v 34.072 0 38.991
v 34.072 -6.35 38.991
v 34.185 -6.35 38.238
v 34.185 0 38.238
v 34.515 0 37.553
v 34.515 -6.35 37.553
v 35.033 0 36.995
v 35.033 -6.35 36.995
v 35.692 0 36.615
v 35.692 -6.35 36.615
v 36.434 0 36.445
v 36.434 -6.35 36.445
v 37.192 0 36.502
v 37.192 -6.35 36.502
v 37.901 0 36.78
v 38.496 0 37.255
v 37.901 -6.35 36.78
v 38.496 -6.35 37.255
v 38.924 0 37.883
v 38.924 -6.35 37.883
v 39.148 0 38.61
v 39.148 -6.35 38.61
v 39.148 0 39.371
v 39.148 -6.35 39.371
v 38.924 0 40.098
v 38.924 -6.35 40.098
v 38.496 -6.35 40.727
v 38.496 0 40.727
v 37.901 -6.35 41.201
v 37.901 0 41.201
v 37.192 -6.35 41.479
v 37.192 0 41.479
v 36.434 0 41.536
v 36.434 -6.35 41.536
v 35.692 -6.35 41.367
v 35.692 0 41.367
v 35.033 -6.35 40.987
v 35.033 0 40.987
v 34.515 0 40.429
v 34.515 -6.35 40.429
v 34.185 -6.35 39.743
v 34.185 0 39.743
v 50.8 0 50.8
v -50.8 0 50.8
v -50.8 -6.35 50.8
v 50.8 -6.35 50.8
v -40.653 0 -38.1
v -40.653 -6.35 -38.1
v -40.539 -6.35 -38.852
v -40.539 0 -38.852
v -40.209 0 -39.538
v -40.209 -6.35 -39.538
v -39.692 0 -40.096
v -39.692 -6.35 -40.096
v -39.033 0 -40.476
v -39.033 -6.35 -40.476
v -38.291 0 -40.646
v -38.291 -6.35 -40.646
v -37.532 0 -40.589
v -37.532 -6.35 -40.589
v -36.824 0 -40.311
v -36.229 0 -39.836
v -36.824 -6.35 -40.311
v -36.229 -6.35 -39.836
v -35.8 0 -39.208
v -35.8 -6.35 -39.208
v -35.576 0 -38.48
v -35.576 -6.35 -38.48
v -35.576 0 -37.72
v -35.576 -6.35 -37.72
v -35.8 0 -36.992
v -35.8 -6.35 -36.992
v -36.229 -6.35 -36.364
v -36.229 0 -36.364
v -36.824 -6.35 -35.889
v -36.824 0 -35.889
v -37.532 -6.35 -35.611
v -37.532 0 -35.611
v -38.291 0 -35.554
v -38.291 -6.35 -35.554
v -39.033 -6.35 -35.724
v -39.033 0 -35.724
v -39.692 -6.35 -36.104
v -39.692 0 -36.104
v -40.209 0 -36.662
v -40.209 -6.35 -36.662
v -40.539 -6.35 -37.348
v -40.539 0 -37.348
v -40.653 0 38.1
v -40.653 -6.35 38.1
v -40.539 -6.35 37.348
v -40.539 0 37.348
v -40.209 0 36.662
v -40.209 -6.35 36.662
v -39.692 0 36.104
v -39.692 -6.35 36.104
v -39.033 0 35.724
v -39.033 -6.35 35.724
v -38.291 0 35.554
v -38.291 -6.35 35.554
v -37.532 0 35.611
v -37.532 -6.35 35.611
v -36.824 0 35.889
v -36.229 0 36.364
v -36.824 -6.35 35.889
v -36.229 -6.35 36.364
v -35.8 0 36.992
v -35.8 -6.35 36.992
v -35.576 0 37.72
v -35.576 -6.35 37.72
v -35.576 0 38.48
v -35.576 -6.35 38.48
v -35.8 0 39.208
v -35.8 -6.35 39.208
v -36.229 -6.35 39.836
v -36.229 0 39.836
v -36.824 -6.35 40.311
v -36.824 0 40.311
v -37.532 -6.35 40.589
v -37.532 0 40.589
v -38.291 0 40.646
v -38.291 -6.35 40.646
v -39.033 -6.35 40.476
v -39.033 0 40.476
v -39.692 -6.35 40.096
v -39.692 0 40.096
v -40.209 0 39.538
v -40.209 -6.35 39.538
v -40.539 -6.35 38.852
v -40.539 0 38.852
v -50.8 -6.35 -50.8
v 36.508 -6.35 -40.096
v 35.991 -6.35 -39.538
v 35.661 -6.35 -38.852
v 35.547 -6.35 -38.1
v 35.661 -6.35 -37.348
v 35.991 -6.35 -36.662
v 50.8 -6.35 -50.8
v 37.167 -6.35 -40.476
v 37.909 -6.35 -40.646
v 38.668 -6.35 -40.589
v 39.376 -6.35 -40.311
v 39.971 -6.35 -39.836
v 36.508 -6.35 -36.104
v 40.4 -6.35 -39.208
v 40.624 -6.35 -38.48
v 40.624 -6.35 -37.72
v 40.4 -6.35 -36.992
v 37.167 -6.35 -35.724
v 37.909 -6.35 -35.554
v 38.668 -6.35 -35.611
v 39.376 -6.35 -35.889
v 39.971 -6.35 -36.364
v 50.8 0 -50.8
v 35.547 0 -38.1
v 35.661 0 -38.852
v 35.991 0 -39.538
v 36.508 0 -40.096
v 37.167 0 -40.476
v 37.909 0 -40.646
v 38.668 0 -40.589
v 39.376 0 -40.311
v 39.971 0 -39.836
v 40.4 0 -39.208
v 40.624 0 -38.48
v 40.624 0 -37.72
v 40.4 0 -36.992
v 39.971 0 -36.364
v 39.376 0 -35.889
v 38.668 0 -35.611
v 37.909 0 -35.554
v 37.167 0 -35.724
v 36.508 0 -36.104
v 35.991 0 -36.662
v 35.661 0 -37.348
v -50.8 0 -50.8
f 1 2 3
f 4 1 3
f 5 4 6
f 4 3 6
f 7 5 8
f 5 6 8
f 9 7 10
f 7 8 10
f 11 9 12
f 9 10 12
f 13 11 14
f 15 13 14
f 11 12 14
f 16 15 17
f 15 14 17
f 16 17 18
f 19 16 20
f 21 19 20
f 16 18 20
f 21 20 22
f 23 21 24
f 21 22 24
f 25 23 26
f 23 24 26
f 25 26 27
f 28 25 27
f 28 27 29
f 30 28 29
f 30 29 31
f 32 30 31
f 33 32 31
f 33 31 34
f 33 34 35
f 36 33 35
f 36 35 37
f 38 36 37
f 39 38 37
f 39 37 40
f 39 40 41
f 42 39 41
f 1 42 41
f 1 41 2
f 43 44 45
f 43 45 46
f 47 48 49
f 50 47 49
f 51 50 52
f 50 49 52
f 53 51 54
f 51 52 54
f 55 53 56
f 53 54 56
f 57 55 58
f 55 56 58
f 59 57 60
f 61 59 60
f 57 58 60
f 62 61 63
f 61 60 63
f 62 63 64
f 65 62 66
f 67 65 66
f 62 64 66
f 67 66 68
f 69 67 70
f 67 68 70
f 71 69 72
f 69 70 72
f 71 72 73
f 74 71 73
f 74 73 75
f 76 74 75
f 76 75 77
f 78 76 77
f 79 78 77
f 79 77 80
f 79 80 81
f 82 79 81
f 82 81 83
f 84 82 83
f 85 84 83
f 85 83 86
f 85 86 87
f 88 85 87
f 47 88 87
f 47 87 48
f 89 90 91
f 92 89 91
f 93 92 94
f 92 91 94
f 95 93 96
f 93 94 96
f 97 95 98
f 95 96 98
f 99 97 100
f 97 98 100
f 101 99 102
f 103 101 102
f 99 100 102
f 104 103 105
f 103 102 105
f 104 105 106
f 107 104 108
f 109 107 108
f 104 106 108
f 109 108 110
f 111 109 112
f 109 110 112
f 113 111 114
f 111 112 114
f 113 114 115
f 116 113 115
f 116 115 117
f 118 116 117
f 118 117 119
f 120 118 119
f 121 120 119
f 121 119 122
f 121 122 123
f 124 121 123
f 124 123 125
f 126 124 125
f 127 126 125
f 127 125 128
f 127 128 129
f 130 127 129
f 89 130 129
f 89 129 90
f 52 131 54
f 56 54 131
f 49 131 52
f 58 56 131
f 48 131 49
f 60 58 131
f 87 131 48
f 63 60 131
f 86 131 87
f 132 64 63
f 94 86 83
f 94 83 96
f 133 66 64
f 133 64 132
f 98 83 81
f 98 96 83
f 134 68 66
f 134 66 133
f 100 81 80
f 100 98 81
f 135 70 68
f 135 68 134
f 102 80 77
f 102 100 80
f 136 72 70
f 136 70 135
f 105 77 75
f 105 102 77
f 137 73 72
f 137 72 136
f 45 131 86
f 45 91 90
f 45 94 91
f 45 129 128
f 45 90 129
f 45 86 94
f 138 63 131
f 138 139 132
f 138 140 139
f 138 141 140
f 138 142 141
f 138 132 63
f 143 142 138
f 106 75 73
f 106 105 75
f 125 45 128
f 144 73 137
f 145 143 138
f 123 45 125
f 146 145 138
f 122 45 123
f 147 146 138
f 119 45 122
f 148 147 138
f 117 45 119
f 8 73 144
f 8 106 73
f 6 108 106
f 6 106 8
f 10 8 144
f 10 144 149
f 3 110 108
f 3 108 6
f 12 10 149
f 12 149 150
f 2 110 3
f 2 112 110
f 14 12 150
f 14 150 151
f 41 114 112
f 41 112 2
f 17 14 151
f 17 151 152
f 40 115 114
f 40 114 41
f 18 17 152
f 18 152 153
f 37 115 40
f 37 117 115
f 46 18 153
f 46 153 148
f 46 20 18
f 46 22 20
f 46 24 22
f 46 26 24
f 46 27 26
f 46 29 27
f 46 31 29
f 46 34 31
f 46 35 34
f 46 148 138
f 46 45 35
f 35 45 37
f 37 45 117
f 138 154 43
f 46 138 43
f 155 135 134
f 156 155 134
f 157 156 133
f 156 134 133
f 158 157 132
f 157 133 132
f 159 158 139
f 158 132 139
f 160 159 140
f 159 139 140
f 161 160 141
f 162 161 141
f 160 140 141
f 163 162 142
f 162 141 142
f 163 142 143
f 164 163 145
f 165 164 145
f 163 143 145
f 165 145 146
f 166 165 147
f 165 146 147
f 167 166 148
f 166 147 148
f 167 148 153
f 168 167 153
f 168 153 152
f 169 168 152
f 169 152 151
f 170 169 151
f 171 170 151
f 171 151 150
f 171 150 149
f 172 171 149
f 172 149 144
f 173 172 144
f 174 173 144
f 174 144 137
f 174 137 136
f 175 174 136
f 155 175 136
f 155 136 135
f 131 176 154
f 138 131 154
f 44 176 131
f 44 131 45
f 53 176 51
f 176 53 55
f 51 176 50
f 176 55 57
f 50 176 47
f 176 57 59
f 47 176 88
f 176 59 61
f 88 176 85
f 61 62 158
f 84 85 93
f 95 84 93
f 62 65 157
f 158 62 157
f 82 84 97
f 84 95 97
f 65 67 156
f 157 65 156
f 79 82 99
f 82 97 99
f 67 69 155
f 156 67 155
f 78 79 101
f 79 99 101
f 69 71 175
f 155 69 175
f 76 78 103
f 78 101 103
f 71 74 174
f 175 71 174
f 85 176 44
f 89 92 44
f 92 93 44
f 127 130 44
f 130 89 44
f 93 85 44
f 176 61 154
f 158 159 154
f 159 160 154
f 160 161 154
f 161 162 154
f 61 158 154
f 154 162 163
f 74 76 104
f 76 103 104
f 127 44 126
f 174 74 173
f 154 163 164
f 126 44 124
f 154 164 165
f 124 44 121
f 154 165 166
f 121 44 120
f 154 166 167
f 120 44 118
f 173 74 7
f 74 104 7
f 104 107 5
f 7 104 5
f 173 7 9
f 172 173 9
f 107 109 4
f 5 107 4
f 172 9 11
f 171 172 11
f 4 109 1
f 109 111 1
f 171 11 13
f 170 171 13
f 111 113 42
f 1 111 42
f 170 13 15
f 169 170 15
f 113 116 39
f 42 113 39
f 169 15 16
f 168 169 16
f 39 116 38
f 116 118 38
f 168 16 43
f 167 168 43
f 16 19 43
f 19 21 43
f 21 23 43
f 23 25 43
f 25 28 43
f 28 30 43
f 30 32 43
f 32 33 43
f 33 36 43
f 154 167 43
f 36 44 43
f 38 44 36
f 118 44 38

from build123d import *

# Parameters (mm, degrees)
F0_W     = 101.6
F0_H     = 101.6
F1_DEPTH = 6.35
F2_D     = 5.1054
F3_D     = 5.1054


# Not quite as in the source:
# - a feature names something its author has since deleted; it is built from what else it names


with BuildPart() as f1:
    # F0 (on Front) → F1 (new body)
    with BuildSketch(Plane.XZ):
        Rectangle(F0_W, F0_H)
    extrude(amount=F1_DEPTH)

    # F2 (through all)
    with Locations(Plane(origin=(0, 0, 0), x_dir=(1, 0, 0), z_dir=(0, 1, 0))):
        with Locations((-38.1, -38.1), (38.1, 38.1), (-38.1, 38.1)):
            Hole(F2_D / 2)

    # F3 (through all)
    with Locations(Plane(origin=(0, 0, 0), x_dir=(1, 0, 0), z_dir=(0, 1, 0))):
        with Locations((36.6242937744, -38.9907881618)):
            Hole(F3_D / 2)


solid = f1.part
